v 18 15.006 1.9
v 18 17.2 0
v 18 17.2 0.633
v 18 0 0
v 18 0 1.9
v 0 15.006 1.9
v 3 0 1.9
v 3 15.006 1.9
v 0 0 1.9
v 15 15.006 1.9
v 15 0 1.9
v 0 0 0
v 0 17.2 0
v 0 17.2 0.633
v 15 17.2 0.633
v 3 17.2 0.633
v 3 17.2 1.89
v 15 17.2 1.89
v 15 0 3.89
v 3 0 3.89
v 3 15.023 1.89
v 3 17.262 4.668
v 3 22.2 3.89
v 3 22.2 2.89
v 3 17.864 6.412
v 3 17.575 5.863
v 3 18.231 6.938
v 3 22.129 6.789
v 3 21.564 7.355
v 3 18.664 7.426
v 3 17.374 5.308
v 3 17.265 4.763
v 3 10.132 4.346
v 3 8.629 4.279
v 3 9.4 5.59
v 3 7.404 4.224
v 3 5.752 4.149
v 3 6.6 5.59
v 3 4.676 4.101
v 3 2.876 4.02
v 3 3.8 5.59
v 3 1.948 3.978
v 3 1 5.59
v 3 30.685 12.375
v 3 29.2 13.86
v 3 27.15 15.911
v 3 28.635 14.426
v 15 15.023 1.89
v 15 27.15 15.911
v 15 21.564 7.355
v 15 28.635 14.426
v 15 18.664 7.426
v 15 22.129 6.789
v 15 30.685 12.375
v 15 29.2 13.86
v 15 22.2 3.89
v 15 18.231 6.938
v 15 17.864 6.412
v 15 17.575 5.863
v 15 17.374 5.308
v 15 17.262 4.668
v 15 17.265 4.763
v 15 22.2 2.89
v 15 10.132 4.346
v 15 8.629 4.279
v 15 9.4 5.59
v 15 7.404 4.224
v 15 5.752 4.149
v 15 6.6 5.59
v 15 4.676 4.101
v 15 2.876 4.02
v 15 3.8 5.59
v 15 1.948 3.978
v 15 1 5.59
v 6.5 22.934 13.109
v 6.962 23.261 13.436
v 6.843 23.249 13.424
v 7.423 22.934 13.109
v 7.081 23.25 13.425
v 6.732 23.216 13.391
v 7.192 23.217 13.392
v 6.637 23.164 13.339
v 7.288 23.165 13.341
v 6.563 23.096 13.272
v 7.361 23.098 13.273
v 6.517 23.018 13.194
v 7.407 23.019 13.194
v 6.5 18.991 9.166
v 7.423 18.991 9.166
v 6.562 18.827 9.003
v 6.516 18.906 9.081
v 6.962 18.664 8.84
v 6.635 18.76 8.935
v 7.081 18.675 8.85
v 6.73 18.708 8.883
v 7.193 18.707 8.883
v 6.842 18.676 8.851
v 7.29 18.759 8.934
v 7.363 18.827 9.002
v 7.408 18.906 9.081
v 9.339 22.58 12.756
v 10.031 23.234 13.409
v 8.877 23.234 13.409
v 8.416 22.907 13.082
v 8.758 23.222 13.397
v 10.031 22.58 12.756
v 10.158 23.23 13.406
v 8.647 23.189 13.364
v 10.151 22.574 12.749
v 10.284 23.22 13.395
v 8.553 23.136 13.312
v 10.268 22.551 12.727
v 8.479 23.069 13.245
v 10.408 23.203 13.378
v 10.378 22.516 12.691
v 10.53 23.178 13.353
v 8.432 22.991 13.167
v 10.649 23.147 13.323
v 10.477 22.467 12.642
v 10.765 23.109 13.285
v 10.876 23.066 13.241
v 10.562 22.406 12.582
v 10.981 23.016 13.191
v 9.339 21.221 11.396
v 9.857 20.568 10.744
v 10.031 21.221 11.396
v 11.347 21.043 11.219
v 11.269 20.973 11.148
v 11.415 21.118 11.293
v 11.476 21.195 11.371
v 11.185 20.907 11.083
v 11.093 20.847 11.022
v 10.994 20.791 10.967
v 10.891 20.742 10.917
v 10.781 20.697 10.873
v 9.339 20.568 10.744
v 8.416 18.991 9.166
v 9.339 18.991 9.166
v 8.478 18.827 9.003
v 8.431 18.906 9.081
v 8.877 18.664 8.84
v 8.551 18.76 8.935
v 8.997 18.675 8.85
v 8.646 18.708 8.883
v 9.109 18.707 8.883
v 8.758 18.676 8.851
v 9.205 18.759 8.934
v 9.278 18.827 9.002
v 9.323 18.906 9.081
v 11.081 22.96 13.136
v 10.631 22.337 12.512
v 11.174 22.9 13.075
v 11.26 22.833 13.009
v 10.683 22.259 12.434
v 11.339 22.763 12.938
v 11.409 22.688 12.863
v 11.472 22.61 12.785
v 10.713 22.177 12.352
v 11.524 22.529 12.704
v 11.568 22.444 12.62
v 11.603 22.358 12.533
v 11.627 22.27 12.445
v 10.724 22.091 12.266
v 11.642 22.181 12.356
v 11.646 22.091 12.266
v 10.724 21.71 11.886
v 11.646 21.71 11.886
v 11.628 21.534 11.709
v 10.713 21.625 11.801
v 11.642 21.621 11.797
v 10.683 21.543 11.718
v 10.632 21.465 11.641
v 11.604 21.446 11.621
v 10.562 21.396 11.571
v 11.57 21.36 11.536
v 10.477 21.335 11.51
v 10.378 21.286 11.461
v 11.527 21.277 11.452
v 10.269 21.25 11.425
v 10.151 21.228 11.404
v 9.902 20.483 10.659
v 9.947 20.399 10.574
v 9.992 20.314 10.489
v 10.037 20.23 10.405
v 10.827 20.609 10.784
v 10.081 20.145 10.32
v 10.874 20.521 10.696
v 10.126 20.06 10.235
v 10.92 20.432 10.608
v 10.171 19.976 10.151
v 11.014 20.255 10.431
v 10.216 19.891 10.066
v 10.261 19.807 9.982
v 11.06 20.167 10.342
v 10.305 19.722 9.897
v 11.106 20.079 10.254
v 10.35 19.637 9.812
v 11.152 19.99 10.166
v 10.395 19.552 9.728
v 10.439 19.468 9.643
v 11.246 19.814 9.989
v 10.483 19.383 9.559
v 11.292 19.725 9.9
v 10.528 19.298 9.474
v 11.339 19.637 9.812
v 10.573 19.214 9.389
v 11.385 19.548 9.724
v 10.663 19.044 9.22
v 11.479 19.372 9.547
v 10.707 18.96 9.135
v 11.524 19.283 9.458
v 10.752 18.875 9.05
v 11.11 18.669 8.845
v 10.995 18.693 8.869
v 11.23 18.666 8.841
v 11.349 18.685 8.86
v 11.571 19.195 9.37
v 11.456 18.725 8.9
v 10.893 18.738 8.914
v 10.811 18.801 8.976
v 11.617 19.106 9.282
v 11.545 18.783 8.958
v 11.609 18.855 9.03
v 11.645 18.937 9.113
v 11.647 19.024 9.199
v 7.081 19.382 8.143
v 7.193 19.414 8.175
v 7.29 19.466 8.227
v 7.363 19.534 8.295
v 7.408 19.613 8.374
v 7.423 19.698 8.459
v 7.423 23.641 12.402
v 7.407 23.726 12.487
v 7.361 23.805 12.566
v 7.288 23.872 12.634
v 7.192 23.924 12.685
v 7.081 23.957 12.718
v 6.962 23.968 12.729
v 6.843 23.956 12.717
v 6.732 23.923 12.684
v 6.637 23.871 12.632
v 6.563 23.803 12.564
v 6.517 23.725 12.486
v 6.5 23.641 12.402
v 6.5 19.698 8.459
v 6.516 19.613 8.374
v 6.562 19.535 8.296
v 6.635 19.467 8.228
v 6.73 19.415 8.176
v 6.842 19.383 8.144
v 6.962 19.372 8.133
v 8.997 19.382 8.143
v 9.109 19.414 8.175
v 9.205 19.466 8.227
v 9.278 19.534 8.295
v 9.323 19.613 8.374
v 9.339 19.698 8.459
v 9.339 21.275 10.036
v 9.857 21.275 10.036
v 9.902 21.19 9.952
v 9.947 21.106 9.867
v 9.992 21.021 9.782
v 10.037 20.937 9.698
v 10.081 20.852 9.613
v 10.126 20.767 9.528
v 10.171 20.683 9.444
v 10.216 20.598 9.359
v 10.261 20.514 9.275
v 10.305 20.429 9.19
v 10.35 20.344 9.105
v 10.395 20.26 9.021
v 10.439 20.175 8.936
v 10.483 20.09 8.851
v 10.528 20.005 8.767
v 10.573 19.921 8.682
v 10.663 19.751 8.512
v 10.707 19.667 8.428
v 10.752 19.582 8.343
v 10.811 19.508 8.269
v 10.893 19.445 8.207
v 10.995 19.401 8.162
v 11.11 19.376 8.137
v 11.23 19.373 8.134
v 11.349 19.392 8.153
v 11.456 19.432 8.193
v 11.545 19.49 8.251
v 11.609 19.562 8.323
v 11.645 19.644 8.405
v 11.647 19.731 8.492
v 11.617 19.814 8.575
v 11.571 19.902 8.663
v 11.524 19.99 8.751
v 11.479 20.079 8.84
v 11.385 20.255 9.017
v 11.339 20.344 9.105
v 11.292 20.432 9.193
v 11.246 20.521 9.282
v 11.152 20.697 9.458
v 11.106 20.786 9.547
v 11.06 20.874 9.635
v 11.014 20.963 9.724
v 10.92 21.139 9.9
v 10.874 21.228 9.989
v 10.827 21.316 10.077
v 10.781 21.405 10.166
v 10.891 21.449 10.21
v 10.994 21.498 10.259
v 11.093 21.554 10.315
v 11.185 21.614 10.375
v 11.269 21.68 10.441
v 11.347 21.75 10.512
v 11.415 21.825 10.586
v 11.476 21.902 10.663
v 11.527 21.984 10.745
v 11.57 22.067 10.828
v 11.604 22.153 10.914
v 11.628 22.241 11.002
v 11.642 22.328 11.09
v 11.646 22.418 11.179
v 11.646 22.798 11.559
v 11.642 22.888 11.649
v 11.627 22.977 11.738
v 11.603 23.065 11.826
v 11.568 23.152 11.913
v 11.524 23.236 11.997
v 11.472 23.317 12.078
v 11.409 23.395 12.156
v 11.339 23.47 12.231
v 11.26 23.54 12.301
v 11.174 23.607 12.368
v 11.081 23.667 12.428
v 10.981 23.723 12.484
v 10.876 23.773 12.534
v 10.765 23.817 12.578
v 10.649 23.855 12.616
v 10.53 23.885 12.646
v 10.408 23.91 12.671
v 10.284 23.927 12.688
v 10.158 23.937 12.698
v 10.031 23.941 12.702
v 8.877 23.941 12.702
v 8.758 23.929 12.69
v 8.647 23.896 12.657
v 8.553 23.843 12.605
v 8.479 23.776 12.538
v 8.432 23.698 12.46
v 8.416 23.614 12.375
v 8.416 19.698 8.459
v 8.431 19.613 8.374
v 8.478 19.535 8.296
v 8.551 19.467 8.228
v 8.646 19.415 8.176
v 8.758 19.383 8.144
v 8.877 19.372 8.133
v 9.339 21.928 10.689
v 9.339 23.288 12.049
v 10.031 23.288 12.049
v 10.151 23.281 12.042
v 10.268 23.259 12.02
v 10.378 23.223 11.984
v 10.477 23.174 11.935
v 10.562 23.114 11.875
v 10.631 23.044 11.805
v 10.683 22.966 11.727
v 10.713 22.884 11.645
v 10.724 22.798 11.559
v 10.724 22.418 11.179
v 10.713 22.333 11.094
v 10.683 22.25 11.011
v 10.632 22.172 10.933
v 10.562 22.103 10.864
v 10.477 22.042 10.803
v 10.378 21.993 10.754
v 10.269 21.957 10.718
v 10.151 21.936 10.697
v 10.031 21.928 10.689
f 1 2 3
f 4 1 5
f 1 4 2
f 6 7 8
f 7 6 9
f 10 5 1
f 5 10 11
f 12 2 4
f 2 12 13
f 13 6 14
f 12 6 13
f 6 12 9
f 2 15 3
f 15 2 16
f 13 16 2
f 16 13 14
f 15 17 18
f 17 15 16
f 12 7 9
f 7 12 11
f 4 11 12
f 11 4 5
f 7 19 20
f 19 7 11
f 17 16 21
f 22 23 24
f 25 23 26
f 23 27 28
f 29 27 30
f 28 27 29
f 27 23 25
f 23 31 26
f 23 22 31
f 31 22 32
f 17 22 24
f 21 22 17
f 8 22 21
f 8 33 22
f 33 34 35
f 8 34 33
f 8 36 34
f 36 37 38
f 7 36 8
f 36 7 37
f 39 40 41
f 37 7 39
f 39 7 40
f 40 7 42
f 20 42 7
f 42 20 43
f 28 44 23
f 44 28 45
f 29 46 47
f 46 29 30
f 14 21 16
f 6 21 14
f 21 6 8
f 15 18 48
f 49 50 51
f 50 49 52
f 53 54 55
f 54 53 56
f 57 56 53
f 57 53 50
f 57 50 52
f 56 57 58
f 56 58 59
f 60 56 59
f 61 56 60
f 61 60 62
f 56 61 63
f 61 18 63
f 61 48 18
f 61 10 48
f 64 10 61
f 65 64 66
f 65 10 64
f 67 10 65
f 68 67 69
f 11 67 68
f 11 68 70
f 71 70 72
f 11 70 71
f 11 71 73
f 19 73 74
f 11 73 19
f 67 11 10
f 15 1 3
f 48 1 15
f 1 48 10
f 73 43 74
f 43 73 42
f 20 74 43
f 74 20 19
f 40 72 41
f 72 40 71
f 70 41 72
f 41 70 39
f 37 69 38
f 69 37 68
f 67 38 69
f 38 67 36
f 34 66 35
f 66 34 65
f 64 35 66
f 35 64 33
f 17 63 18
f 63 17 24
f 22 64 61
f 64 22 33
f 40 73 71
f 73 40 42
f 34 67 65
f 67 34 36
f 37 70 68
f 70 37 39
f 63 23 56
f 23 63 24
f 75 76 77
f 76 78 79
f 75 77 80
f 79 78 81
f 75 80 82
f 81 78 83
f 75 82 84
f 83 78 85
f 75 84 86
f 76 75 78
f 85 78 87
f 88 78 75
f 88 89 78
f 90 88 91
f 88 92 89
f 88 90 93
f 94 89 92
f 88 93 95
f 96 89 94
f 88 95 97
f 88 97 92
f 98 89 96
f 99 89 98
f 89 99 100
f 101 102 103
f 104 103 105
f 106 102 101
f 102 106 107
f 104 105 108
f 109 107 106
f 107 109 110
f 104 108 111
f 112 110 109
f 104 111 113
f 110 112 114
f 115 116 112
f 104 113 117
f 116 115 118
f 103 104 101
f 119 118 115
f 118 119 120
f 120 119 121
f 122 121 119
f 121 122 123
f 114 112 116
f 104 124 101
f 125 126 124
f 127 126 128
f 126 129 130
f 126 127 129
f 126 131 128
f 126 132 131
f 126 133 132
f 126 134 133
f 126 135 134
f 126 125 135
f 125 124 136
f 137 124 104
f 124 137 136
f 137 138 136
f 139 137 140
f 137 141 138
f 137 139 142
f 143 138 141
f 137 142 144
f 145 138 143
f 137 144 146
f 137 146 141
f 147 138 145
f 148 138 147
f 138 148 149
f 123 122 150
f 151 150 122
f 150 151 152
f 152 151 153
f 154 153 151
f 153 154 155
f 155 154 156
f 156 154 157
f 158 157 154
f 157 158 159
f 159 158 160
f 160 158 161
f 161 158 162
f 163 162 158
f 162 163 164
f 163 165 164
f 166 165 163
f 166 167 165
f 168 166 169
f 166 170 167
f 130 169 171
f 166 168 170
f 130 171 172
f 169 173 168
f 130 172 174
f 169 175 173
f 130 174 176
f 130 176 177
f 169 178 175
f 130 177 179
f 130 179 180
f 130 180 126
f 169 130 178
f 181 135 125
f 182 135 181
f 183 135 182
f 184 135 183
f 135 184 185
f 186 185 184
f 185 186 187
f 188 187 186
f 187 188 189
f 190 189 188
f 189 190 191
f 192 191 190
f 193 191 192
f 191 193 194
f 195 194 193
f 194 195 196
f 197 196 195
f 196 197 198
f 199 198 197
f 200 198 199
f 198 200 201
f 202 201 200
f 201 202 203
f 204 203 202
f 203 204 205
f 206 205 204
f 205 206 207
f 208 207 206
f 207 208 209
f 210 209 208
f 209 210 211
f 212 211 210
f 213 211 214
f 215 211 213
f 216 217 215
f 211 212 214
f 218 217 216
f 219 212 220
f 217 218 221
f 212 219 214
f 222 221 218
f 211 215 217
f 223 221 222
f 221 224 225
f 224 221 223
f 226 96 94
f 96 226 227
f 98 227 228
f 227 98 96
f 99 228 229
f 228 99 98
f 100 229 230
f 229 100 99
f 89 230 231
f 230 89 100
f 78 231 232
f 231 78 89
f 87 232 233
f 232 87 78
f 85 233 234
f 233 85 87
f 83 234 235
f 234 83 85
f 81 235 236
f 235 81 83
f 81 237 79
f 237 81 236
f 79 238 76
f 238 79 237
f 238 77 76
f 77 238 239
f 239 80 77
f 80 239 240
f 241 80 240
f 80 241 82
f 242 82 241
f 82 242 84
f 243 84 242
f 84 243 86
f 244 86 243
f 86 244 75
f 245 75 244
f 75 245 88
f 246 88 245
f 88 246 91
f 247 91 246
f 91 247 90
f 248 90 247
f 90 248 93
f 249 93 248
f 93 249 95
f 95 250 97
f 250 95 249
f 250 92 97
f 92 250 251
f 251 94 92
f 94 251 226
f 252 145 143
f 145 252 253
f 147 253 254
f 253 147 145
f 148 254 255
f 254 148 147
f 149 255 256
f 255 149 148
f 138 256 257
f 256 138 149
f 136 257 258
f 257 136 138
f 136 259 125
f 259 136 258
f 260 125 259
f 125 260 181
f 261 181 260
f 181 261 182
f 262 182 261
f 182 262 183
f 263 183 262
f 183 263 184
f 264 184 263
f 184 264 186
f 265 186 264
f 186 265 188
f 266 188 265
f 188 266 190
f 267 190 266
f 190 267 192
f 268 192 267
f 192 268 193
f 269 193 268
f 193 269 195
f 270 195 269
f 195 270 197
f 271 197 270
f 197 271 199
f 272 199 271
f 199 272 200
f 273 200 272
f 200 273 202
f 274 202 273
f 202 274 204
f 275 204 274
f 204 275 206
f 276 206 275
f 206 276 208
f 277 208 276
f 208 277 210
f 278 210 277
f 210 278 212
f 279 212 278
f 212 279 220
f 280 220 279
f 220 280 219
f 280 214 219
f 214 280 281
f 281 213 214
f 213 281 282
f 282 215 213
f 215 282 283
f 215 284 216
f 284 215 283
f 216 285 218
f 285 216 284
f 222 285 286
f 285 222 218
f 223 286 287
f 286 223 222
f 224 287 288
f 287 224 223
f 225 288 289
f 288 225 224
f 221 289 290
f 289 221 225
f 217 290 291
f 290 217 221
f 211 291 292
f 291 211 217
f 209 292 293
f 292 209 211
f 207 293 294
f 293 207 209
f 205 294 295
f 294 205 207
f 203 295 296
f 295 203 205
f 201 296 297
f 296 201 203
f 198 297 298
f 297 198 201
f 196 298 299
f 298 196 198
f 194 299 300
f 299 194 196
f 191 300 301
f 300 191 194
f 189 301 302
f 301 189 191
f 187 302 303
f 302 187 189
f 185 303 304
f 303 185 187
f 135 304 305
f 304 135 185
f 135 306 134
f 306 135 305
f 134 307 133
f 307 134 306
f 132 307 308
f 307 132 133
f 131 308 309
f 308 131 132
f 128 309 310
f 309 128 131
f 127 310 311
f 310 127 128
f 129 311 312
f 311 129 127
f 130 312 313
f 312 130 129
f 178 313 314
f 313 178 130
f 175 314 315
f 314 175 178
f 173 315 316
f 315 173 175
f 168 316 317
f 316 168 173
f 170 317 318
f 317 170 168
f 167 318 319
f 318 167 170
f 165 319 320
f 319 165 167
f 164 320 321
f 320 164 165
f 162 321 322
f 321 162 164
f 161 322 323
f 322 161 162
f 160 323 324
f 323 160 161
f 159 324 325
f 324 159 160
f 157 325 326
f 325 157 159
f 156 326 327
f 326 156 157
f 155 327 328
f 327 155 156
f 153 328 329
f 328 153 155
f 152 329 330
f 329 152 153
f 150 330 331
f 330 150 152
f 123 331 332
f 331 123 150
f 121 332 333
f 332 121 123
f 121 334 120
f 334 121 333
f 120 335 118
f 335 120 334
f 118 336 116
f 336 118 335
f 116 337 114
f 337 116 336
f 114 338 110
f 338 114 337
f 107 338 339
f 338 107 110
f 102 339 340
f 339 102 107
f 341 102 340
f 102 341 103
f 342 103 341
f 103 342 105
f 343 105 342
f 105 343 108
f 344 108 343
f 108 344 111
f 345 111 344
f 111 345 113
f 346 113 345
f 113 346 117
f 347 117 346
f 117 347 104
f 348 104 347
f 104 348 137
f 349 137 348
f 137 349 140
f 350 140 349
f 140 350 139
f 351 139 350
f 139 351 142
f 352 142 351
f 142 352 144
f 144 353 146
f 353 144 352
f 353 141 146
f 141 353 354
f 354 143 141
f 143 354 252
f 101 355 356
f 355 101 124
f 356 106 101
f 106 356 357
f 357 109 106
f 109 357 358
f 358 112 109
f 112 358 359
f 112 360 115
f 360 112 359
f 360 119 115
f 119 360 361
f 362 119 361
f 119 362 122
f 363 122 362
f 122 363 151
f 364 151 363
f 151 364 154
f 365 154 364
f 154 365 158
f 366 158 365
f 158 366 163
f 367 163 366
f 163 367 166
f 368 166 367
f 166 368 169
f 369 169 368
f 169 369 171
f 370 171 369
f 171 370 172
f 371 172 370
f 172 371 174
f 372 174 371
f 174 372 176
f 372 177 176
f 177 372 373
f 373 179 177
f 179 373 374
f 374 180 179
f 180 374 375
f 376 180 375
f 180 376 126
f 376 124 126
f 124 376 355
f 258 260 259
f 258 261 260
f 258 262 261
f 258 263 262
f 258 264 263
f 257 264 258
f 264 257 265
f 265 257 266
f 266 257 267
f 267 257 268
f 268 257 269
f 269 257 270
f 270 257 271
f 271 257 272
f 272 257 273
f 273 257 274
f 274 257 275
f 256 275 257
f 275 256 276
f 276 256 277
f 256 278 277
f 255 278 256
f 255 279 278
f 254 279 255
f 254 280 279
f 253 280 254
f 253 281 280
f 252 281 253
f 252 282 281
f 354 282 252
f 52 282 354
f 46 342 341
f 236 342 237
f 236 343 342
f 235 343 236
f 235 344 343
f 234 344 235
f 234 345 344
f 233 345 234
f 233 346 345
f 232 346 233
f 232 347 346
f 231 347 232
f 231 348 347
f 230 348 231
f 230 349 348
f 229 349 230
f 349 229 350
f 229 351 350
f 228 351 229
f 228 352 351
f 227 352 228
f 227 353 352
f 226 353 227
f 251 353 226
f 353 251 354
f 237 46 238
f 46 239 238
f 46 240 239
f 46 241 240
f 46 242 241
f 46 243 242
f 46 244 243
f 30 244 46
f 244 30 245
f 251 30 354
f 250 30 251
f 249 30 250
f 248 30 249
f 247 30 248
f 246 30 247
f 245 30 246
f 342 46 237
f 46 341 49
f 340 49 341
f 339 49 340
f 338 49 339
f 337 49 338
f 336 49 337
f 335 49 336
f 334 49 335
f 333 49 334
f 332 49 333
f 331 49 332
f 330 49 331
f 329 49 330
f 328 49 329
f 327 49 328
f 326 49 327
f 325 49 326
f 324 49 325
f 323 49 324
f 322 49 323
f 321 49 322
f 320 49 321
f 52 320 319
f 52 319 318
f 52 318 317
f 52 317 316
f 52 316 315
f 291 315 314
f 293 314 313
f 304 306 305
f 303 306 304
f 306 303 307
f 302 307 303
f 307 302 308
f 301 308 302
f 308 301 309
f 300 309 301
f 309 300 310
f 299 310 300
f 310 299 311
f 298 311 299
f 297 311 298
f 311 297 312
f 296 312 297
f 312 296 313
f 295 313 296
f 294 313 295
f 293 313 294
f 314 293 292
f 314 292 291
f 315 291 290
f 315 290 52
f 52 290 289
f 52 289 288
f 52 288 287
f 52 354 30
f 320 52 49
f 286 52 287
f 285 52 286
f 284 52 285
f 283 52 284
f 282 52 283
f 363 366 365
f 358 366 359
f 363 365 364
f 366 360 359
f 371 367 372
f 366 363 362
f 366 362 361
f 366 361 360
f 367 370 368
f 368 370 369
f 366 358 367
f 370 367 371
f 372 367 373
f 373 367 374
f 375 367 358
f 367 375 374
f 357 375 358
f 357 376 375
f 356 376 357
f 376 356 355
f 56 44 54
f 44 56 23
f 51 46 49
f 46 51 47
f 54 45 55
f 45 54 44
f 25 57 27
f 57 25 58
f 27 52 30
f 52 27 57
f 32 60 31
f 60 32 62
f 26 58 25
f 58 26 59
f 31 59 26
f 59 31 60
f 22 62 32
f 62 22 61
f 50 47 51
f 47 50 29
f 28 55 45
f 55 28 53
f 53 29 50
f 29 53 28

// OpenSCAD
// file: hotshoe_paper_clip.scad
hs_w      = 18.0;
hs_l      = 17.2;
hs_h      = 1.9; // 2
hs2_w     = 12;
//hs2_l     = hs_l+5;
hs2_h     = 2;
hs2_x_off = (hs_w-hs2_w)/2;
hs2_elev  = 1;
hs3_l     = 12;
hs3_h     = 5;
hs3_w     = 0.8;

module hotshoe(
    logofile="", logooffset=1,
    len=5
    ) {
    hs2_l = hs_l+len;
    union() {
        // lower hotshoe
        difference() {
            cube([hs_w, hs_l, hs_h]);
            translate([-1,hs_l,hs_h/3]) rotate([60,0,0]) cube([hs2_x_off+1, 10,10]);
            translate([hs2_x_off+hs2_w,hs_l,hs_h/3]) rotate([60,0,0]) cube([hs2_x_off+1, 10,10]);
        }
        // upper plate including grip
        translate([hs2_x_off, 0, hs_h-0.01]) {
            rotate([90,0,90])
            linear_extrude(height=hs2_w) {
                polygon(
                points=[[0,0], [hs2_l,0], [hs_l,0], [hs2_l,hs2_elev],[hs2_l,hs2_elev+hs2_h],
                //[hs_l,hs2_h],
                [0,hs2_h]],
                paths=[[0,1,2,3,4,5,6]]
                );
            }
            for ( i = [0:3]) {
                translate([hs2_w/2,1+2.8*(i),hs2_h]) scale([1,1,1.7]) rotate([45,0,0]) cube([hs2_w,sqrt(2), sqrt(2)], center=true);
            }
        }
        translate([hs2_x_off, hs2_l, hs_h+hs2_elev+hs2_h/2-0.01])
        rotate([45,0,0])
        difference() {
            union() {
                // Logo
                translate([logooffset,1,hs3_h-1]) linear_extrude(height=1+1) import(file=logofile);
                // clasp
                cube([hs2_w, hs3_l, hs3_h]);
                translate([0,0,hs3_h/2]) scale([1,1.5,1]) rotate([0,90,0]) cylinder(h=hs2_w, r=hs3_h/2, $fn=36);
            }
            translate([-1,2,(hs3_h-hs3_w)/2]) cube([hs2_w+2, hs3_l, hs3_w]);
        }
    }
}
// main file
include <hotshoe_paper_clip.scad>

hotshoe(logofile="IR.dxf", logooffset=3.5);
